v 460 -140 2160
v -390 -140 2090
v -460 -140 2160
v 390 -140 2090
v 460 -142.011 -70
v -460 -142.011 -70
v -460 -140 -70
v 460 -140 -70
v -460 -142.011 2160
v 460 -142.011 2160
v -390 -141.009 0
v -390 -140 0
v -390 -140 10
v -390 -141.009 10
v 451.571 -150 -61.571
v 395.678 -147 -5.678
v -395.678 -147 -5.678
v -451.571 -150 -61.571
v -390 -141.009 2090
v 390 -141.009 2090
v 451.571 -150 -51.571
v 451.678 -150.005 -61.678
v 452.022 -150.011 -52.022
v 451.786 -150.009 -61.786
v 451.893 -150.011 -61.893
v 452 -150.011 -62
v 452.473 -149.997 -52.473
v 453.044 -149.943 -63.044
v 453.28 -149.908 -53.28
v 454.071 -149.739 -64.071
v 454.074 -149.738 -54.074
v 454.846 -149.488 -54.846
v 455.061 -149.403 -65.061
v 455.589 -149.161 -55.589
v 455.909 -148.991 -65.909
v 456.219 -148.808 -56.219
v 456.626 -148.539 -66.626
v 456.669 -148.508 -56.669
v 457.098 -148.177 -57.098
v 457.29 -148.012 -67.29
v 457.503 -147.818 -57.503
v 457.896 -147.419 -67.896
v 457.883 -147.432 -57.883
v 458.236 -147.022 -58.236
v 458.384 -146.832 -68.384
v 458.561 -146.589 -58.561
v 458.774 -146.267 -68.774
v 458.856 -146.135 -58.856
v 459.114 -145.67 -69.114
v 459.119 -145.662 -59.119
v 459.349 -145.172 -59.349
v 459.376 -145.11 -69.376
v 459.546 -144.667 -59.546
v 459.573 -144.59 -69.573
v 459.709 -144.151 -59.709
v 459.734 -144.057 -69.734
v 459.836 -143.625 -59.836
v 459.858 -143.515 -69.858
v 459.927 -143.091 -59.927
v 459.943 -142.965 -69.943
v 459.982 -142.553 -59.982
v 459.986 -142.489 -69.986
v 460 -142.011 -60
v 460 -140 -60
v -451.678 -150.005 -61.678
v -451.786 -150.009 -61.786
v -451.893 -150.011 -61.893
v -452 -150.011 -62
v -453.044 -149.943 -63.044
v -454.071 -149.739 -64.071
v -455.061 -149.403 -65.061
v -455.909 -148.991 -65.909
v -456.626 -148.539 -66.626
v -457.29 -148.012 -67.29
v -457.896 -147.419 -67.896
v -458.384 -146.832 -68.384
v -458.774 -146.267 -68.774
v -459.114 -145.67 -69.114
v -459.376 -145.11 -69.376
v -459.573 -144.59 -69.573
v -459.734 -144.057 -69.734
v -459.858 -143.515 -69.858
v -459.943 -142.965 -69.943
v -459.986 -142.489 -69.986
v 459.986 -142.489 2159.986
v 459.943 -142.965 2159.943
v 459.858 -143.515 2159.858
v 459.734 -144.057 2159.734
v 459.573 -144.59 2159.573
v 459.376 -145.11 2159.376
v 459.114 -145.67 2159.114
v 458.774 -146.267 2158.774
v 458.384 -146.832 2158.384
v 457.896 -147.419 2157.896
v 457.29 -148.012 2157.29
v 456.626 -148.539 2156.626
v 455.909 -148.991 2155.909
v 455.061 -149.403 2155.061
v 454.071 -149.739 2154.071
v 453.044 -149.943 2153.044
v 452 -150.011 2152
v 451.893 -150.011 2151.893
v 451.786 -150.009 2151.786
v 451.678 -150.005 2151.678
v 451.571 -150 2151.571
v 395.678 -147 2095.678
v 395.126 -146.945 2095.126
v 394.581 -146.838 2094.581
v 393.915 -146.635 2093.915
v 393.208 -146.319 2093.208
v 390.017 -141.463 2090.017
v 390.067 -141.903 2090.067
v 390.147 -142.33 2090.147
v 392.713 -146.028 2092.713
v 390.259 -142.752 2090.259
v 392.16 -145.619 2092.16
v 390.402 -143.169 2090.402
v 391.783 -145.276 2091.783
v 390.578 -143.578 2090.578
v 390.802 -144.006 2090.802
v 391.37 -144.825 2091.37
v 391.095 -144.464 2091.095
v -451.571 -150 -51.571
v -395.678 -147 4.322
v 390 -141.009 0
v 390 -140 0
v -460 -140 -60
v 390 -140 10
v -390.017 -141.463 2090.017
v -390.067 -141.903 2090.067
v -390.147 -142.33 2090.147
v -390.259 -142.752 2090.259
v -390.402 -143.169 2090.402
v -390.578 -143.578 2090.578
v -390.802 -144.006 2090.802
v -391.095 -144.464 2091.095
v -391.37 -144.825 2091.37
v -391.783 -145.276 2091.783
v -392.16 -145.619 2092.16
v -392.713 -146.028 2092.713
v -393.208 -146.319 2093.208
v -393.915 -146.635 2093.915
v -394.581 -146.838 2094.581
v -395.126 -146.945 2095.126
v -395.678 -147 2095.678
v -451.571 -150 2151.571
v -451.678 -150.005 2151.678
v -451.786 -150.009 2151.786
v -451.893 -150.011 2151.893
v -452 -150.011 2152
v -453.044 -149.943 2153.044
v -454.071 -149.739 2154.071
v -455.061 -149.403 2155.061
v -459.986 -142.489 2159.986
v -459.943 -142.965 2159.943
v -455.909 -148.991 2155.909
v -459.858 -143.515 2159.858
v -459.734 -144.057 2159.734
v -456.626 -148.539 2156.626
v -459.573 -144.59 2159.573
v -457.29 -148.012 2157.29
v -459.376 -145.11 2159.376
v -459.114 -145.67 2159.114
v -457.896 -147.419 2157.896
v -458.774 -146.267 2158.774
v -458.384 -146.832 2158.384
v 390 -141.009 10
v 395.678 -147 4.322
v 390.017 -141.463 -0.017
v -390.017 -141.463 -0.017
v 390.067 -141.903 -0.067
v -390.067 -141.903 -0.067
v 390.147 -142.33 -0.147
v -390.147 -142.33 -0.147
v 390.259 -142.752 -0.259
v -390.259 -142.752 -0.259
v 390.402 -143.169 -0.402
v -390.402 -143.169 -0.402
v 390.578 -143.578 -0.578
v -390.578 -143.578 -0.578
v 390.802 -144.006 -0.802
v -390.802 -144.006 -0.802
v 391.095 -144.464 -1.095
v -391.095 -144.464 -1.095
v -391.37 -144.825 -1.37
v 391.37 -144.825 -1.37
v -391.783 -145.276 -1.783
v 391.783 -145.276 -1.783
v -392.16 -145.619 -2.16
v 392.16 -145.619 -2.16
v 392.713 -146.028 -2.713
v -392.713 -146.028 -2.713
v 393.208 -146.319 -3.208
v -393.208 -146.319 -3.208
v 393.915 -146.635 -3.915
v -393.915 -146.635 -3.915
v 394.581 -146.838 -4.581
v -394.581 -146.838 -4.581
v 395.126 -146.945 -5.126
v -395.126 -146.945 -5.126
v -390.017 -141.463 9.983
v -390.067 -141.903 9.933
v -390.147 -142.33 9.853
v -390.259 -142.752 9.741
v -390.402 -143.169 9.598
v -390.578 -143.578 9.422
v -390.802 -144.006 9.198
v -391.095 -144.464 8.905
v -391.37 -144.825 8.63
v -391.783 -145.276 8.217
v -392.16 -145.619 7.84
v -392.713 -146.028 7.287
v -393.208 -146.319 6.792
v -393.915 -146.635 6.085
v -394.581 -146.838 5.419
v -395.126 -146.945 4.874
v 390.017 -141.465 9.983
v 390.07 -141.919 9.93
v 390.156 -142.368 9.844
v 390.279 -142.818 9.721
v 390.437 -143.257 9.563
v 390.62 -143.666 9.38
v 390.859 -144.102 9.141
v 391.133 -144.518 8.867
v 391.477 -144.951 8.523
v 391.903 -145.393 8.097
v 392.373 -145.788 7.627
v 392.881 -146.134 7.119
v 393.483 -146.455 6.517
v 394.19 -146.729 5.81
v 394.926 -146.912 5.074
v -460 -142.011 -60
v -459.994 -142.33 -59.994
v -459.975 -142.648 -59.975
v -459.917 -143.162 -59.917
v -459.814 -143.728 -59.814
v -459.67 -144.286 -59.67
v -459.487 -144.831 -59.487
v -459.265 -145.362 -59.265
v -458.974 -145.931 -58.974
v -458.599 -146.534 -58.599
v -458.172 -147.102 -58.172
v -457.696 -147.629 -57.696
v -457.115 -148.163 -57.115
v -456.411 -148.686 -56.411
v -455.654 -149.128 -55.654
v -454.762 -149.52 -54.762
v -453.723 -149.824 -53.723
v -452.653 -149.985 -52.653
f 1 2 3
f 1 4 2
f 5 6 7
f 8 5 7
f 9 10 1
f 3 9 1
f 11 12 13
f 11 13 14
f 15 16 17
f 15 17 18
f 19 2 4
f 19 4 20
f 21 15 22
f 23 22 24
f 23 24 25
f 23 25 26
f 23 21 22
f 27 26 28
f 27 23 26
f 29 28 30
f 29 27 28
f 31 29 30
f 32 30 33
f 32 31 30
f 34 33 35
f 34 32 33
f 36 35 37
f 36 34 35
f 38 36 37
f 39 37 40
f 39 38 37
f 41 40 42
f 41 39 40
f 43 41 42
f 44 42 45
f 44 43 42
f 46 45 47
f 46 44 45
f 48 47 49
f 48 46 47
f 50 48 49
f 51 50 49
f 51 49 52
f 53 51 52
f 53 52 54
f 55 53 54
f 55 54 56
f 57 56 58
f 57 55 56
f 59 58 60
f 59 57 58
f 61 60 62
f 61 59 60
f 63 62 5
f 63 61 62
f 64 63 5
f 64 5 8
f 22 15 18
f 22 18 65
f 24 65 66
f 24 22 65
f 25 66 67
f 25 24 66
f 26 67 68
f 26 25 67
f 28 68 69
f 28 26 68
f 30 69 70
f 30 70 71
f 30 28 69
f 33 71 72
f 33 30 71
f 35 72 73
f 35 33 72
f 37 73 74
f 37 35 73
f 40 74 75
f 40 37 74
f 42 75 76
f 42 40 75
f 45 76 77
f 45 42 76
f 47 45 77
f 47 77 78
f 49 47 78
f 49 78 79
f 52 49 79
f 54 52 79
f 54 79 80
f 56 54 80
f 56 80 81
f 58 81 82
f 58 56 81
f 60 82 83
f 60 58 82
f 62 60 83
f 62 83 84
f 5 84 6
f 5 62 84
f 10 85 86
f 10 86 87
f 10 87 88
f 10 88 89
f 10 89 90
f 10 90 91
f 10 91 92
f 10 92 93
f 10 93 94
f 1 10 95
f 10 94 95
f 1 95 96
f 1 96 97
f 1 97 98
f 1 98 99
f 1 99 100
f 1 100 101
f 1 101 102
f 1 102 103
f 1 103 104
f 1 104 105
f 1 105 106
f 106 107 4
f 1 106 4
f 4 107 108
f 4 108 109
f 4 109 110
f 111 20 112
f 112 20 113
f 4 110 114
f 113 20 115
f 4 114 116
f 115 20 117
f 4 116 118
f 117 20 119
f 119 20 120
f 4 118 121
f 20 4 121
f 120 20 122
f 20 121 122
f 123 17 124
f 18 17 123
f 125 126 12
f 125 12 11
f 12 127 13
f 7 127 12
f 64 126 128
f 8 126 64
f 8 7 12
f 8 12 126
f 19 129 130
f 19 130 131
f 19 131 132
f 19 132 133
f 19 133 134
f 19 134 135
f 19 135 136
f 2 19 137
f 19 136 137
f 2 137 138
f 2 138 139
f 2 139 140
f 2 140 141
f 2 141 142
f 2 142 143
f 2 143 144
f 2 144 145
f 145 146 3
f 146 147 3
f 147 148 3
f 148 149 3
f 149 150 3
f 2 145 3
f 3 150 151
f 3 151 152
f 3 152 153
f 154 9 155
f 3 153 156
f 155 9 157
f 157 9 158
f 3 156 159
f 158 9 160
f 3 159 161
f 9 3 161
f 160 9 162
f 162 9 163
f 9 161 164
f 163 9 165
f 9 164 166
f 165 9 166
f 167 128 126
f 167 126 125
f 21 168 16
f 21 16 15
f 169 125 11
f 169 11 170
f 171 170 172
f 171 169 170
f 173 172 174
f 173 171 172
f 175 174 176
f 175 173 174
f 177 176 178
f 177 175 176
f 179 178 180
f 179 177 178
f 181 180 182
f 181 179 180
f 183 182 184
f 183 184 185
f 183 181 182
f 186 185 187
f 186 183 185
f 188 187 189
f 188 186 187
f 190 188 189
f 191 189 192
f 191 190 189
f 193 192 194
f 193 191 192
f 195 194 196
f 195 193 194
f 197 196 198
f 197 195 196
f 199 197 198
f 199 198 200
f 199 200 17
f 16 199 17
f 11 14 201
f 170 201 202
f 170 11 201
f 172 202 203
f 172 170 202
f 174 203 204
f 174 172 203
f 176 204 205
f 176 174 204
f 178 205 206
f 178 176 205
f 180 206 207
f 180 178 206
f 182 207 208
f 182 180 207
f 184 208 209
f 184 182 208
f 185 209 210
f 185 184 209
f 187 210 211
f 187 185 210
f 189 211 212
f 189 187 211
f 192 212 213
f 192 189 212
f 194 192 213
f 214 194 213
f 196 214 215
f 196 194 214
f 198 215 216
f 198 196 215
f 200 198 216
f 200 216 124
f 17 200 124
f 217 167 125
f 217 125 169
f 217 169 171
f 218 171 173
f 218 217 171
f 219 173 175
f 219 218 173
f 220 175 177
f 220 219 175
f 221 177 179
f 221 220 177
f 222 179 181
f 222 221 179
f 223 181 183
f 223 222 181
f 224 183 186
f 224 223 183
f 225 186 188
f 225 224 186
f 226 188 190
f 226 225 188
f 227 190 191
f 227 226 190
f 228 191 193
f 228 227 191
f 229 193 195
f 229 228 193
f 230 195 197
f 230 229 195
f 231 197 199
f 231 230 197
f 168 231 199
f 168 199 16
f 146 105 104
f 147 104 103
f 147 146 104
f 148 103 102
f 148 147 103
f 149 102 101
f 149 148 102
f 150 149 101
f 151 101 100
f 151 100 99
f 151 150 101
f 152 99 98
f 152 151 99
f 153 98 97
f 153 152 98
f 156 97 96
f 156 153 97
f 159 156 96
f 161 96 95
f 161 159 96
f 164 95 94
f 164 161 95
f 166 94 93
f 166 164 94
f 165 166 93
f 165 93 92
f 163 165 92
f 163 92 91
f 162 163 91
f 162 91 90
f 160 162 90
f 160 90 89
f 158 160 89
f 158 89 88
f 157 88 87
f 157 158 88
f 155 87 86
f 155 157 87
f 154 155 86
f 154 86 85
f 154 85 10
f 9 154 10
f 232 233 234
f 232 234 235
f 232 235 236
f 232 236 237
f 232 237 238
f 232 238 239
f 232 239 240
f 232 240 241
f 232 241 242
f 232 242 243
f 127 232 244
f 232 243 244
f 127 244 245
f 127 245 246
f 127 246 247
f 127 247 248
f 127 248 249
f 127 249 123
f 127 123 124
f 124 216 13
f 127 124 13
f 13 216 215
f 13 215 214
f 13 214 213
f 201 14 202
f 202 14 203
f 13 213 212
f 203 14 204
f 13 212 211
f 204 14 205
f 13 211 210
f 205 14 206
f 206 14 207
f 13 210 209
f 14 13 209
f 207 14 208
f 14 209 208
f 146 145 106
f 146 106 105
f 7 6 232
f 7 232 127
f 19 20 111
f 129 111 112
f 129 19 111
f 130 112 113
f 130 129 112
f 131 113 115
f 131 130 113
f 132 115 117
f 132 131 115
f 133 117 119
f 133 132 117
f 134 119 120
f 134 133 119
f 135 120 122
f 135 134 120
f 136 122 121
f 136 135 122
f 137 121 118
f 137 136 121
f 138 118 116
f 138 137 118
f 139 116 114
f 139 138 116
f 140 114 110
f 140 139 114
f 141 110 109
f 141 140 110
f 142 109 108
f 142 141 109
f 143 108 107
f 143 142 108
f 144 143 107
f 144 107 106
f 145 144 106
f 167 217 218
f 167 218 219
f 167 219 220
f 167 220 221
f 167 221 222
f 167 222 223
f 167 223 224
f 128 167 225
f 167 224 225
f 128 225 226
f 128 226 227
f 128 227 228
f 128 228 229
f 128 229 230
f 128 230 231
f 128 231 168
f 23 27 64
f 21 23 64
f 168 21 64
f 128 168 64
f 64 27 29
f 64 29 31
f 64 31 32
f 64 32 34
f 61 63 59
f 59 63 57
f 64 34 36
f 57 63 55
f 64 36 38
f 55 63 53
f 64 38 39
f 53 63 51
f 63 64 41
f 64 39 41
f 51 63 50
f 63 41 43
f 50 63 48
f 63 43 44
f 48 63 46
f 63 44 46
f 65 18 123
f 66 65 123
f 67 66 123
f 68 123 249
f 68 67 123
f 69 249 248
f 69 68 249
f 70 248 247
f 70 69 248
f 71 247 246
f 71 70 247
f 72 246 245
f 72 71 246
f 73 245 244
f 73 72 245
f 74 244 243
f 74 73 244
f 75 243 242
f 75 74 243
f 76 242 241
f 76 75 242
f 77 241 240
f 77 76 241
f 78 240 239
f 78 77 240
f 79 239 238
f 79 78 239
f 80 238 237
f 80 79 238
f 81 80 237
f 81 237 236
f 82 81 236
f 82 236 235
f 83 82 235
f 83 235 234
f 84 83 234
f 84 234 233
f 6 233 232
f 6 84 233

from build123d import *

# Parameters (mm, degrees)
EXTRUDE039436_DEPTH = 500
EXTRUDE039434_DEPTH = 500


with BuildPart() as extrude039436_internal_inferior:
    # Sketch225 (on Sketch) → Extrude039436 (new body, symmetric)
    with BuildSketch(Plane.XZ):
        Polygon((-200, 200), (200, 200), (600, -200), (-600, -200), align=None)
    extrude(amount=EXTRUDE039436_DEPTH, both=True)


with BuildPart() as compound051:
    # Sketch223 (on Sketch) → Extrude039434 (new body, symmetric)
    with BuildSketch(Plane.XZ):
        Polygon((-600, 2300), (600, 2300), (200, 1900), (-200, 1900), align=None)
    extrude(amount=EXTRUDE039434_DEPTH, both=True)

    # Compound051: union Extrude039436_internal_inferior_
    add(extrude039436_internal_inferior.part)


with BuildPart() as trim_window_external_horizontal:
    # Sweep011: sweep along a path in Sketch194
    with BuildLine(Plane.XZ.offset(140)) as sweep011_path:
        Line((-390, 2090), (-390, 0))
        Line((-390, 0), (390, 0))
        Line((390, 0), (390, 2090))
        Line((390, 2090), (-390, 2090))
    # Clone2D027 (on Sketch) → Sweep011 (sweep)
    with BuildSketch(Plane(origin=(0, -140, 0), x_dir=(0, 0, 1), z_dir=(1, 0, 0))):
        with BuildLine():
            Line((-61.571224, 10), (-5.678418, 7))
            ThreePointArc((-5.678418, 7), (-1.645147, 5.136003), (0, 1.008624))
            Line((0, 1.008624), (0, 0))
            Line((0, 0), (-70, 0))
            Line((-70, 0), (-70, 2.011499))
            ThreePointArc((-70, 2.011499), (-67.503171, 7.81797), (-61.571224, 10))
        make_face()
    sweep(path=sweep011_path.line, is_frenet=True, transition=Transition.RIGHT)

    # Common003: intersect Compound051_
    add(compound051.part, mode=Mode.INTERSECT)


solid = trim_window_external_horizontal.part
